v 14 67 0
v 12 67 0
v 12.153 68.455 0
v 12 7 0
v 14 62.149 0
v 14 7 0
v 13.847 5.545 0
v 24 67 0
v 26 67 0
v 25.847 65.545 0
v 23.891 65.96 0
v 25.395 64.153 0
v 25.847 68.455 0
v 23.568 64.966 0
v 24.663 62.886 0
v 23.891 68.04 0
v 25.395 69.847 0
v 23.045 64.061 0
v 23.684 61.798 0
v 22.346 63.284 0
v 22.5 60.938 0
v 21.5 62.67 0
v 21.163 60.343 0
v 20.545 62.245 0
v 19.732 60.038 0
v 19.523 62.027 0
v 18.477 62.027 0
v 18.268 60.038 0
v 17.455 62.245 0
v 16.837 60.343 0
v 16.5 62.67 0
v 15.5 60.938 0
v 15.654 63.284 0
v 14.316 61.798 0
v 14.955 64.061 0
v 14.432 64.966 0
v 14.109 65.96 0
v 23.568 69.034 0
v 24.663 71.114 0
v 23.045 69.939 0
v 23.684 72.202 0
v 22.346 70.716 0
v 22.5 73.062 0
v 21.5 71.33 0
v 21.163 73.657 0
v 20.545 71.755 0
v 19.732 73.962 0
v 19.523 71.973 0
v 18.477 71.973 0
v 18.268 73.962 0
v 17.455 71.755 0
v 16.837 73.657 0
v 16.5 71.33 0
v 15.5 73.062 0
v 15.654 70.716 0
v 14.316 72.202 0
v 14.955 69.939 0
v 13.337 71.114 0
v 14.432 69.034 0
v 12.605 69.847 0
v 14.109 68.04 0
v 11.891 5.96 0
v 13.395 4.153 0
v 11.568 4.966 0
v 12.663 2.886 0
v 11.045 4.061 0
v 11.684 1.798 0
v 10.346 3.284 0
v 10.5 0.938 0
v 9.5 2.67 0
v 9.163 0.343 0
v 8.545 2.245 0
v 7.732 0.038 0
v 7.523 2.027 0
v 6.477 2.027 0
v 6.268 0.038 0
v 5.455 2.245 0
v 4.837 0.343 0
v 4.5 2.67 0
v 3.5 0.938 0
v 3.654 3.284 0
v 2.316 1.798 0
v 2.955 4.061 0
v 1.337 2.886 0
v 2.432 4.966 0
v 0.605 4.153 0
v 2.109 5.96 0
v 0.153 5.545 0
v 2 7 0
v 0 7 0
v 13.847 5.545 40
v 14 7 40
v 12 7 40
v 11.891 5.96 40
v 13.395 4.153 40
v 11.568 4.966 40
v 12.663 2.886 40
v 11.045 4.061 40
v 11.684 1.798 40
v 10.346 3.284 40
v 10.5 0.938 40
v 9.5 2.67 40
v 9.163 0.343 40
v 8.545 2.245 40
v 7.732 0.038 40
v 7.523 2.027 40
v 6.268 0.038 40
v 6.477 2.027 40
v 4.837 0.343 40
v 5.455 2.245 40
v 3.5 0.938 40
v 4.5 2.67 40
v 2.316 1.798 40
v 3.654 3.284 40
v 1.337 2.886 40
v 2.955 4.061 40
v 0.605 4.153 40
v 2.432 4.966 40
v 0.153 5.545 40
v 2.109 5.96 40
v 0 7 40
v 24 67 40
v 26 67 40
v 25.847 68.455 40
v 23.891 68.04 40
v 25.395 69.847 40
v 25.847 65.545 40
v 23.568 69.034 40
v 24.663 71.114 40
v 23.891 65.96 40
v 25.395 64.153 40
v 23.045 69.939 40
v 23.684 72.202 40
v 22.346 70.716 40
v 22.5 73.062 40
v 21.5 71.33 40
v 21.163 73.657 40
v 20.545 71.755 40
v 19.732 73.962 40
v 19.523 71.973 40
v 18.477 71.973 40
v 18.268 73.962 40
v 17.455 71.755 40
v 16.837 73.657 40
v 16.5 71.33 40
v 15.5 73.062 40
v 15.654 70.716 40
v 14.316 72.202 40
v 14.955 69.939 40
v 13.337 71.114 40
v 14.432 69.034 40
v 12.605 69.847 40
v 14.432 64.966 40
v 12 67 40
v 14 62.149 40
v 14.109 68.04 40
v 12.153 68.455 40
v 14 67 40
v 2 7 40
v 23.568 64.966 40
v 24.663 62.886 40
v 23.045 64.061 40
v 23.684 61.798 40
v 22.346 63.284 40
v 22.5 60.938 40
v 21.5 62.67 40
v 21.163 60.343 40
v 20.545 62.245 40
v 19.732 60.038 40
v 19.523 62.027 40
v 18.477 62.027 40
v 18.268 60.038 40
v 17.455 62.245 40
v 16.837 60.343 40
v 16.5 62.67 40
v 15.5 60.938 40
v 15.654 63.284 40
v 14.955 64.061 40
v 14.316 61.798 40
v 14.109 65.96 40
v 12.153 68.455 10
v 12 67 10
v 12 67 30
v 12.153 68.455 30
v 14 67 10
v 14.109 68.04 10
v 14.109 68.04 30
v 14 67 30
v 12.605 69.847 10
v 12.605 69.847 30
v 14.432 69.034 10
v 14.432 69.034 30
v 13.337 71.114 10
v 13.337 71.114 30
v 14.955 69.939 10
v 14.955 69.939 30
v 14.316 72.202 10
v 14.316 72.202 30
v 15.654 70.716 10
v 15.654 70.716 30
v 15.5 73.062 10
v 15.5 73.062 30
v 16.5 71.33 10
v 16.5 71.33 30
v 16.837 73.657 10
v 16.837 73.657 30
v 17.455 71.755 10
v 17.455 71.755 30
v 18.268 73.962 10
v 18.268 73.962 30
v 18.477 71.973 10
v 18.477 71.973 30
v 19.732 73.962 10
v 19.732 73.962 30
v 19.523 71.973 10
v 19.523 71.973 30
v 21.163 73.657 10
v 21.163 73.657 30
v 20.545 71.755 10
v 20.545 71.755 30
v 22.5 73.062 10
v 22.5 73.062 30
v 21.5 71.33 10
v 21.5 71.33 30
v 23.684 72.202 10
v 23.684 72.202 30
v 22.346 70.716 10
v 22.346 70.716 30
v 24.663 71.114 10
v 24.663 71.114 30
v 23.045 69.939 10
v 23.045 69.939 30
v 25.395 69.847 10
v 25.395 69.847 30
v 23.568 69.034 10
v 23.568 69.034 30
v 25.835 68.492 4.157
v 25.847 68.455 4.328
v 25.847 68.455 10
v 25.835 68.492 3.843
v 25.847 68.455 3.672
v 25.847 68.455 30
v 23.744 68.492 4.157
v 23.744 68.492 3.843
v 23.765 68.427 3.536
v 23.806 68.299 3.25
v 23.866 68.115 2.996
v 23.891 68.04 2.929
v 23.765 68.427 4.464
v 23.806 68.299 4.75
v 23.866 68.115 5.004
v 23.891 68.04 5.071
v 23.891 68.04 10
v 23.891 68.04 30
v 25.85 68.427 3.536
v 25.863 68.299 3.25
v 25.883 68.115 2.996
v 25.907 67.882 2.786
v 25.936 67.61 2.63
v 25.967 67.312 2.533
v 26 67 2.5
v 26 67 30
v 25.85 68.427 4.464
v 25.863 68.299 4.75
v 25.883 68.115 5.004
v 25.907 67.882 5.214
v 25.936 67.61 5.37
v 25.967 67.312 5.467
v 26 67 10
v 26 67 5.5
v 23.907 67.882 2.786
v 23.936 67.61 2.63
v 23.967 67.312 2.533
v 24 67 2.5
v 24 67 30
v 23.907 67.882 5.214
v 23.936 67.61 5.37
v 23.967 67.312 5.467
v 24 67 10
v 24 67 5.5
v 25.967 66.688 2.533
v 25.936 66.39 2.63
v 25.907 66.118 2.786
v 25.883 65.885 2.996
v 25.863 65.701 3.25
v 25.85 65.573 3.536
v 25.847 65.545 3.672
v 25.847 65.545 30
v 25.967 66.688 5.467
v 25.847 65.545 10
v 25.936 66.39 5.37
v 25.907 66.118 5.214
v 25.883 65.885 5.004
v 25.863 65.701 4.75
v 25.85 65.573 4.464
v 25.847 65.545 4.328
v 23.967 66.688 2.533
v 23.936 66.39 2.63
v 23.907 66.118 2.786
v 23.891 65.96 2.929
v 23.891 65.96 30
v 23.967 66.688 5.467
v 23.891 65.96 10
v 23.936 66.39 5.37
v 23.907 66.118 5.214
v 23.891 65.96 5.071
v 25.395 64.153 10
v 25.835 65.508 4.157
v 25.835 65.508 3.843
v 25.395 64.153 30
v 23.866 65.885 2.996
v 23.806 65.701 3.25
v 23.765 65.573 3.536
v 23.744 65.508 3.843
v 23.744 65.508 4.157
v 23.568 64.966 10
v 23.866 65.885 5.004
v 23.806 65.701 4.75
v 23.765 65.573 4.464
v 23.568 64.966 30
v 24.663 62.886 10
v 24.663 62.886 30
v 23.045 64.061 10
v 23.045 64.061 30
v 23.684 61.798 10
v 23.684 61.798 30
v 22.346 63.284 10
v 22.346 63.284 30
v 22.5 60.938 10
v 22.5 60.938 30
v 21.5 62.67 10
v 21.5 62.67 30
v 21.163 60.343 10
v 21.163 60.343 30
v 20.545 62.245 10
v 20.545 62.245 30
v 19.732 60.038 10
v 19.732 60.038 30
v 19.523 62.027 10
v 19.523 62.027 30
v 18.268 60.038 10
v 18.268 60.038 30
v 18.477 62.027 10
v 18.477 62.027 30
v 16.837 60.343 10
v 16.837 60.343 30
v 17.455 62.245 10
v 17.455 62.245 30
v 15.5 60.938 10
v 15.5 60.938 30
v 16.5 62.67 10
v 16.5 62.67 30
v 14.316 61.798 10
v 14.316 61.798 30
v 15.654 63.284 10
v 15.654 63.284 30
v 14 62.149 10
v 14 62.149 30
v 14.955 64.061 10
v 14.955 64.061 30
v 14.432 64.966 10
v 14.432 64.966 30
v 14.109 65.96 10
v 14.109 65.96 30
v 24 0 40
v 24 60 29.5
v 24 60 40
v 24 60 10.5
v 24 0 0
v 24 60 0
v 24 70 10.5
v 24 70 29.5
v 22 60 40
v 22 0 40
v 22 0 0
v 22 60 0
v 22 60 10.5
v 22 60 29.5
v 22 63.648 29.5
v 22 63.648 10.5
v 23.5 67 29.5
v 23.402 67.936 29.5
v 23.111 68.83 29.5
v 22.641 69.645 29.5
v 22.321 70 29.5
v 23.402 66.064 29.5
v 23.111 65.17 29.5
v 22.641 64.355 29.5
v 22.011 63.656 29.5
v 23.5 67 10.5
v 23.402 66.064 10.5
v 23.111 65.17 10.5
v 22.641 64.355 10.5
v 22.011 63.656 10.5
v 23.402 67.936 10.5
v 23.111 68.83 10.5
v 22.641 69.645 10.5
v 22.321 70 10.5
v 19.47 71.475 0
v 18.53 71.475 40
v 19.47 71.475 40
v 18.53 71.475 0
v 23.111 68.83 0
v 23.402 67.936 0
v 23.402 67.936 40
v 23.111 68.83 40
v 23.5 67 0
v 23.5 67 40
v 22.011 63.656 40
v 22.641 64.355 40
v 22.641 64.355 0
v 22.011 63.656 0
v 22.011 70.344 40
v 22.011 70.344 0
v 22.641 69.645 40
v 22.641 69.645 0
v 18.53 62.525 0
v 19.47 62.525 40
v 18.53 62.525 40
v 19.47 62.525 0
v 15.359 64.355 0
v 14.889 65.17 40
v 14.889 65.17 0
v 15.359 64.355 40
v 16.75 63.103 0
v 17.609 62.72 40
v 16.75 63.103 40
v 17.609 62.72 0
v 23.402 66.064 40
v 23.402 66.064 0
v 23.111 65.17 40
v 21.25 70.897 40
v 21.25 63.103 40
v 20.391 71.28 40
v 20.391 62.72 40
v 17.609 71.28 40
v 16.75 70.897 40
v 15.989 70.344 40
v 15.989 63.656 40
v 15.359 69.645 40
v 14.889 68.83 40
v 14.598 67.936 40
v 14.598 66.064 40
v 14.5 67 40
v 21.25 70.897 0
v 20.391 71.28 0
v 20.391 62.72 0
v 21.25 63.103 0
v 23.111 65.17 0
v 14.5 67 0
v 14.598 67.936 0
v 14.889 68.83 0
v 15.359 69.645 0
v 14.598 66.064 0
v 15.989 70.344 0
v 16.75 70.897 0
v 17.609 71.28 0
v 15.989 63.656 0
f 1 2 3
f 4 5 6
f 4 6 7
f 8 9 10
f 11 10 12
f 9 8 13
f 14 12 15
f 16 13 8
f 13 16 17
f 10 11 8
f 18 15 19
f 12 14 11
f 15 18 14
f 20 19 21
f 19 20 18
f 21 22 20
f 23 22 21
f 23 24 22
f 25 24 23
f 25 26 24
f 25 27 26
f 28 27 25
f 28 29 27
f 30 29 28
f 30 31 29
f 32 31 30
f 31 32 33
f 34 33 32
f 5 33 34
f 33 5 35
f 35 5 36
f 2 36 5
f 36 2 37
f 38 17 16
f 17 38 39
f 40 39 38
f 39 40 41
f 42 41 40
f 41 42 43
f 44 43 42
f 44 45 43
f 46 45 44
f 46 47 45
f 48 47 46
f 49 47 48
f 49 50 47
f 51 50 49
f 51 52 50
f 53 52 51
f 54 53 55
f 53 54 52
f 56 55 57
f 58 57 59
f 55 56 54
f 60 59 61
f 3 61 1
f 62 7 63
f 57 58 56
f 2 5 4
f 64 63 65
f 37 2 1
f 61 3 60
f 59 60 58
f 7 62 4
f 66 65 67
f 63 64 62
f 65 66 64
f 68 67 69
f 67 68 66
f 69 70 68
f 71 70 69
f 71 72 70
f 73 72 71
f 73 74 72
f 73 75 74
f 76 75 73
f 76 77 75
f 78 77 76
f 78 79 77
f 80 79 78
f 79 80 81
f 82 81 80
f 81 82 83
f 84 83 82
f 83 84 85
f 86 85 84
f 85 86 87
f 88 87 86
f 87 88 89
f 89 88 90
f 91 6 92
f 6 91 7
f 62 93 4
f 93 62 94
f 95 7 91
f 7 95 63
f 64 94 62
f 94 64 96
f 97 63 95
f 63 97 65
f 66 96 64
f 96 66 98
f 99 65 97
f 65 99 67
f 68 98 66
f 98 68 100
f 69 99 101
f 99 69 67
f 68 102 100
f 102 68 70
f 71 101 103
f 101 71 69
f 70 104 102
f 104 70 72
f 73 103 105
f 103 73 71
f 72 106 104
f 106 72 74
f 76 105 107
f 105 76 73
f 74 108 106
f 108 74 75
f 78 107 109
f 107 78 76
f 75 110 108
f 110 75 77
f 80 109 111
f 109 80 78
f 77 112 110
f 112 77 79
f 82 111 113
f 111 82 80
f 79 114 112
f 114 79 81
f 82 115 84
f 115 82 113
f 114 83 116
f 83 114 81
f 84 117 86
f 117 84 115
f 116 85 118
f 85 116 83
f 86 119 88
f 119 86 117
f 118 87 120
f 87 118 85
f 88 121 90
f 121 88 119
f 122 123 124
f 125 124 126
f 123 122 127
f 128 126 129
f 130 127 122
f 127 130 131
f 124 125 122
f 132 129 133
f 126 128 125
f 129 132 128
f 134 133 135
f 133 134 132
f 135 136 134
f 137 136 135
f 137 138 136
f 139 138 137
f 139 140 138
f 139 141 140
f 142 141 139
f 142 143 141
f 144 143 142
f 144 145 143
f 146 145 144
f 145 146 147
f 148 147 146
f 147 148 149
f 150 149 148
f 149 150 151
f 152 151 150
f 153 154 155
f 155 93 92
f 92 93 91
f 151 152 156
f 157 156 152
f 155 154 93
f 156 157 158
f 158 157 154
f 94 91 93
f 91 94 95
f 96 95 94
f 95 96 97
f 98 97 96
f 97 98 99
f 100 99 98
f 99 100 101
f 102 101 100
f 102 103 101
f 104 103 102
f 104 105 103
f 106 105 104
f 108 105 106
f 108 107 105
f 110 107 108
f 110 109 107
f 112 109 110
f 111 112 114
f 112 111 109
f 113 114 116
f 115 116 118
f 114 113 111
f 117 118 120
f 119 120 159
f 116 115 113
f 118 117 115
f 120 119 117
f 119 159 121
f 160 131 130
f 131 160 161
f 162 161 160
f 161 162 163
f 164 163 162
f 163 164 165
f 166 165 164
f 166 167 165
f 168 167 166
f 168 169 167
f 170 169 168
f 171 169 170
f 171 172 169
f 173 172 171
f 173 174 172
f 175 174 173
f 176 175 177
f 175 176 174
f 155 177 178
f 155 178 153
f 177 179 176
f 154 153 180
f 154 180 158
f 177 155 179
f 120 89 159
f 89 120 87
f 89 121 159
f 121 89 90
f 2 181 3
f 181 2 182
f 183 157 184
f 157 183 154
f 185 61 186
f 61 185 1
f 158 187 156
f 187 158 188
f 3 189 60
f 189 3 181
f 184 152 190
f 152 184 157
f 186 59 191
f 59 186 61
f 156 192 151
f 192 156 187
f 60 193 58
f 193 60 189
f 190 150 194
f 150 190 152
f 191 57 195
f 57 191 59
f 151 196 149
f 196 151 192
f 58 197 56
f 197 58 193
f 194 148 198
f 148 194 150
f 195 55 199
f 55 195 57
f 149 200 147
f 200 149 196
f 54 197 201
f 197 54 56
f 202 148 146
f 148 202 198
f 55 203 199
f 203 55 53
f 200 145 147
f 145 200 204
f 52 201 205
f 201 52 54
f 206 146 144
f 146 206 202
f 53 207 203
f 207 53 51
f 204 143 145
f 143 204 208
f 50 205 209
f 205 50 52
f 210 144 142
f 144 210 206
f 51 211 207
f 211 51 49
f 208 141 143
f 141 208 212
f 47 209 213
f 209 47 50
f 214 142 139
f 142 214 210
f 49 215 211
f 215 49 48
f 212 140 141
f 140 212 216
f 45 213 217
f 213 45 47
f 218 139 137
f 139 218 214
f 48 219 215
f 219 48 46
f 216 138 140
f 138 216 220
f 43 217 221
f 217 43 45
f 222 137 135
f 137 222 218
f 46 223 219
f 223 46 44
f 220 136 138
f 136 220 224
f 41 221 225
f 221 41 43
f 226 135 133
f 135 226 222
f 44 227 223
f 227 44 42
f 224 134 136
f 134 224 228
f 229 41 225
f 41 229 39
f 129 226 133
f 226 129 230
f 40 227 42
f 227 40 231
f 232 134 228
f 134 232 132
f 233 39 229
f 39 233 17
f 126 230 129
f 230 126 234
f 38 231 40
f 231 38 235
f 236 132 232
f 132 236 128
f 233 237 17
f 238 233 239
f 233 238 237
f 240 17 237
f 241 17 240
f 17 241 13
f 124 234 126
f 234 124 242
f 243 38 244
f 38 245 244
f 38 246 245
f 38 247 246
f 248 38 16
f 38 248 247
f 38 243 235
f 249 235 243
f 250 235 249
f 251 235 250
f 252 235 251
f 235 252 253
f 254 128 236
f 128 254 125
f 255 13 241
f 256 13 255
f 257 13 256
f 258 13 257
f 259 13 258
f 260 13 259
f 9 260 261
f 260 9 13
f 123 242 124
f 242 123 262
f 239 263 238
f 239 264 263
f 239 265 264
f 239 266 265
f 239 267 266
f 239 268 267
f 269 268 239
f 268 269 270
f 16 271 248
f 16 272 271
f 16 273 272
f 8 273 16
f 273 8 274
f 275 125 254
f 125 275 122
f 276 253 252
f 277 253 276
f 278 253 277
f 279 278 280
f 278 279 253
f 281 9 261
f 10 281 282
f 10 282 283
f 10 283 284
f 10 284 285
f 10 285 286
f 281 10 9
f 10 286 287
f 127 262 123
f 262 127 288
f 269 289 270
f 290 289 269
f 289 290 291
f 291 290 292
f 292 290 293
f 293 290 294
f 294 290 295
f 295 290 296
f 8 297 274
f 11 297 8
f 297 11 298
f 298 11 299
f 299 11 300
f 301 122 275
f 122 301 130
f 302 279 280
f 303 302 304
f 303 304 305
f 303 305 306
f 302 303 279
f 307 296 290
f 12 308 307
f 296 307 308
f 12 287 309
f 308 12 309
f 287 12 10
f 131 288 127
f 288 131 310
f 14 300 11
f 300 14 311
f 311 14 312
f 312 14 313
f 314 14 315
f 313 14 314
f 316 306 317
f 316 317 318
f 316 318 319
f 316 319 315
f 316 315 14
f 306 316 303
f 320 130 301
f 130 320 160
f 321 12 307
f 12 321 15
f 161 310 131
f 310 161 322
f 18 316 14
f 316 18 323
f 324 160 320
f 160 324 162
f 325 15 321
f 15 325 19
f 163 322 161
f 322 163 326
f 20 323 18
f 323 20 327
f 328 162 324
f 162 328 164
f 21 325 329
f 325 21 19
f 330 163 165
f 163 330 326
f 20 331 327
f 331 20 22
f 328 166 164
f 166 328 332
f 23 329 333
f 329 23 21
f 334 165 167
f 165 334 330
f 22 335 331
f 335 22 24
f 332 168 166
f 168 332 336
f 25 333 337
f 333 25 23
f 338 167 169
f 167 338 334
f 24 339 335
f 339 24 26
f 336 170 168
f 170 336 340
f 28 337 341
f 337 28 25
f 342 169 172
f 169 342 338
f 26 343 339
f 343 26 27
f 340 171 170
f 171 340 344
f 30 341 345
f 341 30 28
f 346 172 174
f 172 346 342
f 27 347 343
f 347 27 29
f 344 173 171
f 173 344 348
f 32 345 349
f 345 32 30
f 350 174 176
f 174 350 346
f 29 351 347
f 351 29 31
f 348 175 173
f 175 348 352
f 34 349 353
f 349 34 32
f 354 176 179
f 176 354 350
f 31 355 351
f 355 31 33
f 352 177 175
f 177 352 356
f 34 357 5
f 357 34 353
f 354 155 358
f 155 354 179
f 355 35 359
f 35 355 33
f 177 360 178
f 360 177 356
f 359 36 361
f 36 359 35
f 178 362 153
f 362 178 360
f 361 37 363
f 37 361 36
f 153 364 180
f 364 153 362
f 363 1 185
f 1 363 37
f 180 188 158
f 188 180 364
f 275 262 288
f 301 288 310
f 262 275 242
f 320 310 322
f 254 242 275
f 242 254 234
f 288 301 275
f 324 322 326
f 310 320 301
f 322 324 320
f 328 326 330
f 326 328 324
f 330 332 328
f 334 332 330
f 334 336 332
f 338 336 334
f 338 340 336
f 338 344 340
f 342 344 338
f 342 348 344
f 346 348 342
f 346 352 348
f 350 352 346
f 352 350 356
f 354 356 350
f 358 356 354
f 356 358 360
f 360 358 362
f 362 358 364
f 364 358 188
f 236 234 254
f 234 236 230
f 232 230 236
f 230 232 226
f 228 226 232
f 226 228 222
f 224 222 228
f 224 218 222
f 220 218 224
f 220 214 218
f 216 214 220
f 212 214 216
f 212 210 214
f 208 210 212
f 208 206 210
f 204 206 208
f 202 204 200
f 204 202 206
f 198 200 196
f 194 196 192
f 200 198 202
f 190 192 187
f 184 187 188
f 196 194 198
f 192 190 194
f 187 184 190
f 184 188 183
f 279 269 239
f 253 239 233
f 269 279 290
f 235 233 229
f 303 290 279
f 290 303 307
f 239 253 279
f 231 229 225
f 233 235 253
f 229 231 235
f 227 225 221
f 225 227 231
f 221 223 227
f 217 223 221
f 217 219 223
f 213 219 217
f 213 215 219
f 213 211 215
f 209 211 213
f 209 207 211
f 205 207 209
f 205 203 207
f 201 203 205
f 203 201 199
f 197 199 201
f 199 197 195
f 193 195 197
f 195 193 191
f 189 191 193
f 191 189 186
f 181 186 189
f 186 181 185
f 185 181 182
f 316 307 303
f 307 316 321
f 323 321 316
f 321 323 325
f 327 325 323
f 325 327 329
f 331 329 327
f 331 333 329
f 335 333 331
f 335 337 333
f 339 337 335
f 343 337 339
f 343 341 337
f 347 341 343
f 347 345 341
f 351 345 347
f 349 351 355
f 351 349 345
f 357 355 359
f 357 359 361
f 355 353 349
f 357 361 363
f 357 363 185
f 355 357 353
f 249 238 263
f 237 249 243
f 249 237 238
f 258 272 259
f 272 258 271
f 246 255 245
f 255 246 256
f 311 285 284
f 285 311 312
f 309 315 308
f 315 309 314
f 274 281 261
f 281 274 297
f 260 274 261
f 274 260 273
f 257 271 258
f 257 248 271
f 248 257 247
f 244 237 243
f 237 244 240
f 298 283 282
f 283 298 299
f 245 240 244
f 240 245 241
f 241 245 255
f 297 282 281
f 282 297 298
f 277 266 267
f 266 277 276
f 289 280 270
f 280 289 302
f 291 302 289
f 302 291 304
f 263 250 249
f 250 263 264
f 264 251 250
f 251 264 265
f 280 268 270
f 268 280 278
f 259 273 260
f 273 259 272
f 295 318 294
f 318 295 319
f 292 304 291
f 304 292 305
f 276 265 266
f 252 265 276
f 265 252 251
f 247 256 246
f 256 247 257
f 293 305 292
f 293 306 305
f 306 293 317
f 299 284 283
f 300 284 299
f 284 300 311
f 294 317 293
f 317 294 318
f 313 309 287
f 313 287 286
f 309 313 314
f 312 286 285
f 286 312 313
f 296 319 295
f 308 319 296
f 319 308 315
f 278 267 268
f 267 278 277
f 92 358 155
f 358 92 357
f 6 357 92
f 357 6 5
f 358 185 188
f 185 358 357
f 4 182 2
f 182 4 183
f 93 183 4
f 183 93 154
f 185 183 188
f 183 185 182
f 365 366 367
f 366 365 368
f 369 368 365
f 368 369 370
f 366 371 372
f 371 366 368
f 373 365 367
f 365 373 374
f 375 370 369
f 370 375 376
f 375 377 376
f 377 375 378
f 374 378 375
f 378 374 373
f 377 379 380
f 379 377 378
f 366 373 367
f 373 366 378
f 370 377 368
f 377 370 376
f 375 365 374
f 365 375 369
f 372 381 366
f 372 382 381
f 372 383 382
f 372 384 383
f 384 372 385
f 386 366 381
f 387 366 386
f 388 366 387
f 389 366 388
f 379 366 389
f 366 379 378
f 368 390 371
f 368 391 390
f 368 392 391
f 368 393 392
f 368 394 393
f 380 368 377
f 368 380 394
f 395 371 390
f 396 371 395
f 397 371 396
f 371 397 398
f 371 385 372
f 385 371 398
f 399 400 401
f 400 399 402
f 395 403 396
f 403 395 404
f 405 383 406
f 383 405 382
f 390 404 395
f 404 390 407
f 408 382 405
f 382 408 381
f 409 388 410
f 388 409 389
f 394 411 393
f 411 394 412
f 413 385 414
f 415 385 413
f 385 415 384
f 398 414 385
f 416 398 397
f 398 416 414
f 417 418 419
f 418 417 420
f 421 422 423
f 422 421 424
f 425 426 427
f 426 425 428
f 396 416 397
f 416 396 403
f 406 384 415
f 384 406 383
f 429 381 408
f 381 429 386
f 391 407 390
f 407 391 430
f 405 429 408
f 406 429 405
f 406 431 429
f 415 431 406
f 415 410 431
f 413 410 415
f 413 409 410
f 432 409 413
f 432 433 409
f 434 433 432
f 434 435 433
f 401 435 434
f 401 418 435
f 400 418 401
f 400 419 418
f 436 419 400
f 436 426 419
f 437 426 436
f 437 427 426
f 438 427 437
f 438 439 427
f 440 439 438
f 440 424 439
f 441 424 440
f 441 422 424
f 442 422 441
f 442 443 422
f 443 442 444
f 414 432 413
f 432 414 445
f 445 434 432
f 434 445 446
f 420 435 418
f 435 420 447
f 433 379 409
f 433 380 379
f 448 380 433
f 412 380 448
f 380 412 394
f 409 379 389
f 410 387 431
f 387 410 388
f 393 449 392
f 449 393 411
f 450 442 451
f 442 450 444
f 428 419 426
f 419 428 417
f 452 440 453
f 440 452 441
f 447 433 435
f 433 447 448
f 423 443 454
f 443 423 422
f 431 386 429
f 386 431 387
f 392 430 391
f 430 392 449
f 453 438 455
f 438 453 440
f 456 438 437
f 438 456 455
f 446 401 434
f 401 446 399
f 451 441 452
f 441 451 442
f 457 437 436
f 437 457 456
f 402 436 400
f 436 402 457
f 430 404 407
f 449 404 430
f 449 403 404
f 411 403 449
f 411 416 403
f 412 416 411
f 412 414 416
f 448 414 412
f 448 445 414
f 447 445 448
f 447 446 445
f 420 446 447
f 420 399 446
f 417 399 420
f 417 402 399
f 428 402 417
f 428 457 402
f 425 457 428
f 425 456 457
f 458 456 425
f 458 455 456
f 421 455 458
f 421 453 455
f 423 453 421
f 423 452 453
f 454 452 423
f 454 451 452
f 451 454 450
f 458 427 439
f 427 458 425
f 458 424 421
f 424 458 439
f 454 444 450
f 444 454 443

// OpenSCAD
hook = 14;
plate_w = 2;
plate_h = 60;
plate_d = 40;
gap = 20;


$fn=30;

translate([hook-plate_w, (hook/2), 0])
	cube([plate_w, plate_h, plate_d]);

difference() {
	translate([hook/2, hook/2, 0])
		rotate_extrude(convexity = 5)
			translate([hook/2-plate_w,0,0])
				square([plate_w, plate_d]);

	translate([0,hook/2,-1])
		cube([hook*2, hook*2, plate_d+2]);
}

translate([hook-plate_w,plate_h,0])
difference() {
	translate([hook/2, hook/2, 0])
		rotate_extrude(convexity = 5)
			translate([hook/2-plate_w,0,0])
				square([plate_w, plate_d]);

	translate([-1, -1, plate_d/2-gap/2])
		cube([gap,gap,gap]);

	translate([hook-plate_w*2,hook/2,plate_w*2])
		rotate([0,90,0])
		cylinder(r=1.5,h=5);

}





translate([hook-plate_w+hook-plate_w*2,0,0])
	cube([plate_w, plate_h, plate_d]);

translate([hook-plate_w+hook-plate_w*2, plate_h, plate_d/2-gap/2+0.5])
	cube([plate_w,gap/2,gap-1]);

translate([hook+hook/2-plate_w, plate_h+hook/2 ,0])
	cylinder(r=hook/2-plate_w-0.5, h=plate_d);
